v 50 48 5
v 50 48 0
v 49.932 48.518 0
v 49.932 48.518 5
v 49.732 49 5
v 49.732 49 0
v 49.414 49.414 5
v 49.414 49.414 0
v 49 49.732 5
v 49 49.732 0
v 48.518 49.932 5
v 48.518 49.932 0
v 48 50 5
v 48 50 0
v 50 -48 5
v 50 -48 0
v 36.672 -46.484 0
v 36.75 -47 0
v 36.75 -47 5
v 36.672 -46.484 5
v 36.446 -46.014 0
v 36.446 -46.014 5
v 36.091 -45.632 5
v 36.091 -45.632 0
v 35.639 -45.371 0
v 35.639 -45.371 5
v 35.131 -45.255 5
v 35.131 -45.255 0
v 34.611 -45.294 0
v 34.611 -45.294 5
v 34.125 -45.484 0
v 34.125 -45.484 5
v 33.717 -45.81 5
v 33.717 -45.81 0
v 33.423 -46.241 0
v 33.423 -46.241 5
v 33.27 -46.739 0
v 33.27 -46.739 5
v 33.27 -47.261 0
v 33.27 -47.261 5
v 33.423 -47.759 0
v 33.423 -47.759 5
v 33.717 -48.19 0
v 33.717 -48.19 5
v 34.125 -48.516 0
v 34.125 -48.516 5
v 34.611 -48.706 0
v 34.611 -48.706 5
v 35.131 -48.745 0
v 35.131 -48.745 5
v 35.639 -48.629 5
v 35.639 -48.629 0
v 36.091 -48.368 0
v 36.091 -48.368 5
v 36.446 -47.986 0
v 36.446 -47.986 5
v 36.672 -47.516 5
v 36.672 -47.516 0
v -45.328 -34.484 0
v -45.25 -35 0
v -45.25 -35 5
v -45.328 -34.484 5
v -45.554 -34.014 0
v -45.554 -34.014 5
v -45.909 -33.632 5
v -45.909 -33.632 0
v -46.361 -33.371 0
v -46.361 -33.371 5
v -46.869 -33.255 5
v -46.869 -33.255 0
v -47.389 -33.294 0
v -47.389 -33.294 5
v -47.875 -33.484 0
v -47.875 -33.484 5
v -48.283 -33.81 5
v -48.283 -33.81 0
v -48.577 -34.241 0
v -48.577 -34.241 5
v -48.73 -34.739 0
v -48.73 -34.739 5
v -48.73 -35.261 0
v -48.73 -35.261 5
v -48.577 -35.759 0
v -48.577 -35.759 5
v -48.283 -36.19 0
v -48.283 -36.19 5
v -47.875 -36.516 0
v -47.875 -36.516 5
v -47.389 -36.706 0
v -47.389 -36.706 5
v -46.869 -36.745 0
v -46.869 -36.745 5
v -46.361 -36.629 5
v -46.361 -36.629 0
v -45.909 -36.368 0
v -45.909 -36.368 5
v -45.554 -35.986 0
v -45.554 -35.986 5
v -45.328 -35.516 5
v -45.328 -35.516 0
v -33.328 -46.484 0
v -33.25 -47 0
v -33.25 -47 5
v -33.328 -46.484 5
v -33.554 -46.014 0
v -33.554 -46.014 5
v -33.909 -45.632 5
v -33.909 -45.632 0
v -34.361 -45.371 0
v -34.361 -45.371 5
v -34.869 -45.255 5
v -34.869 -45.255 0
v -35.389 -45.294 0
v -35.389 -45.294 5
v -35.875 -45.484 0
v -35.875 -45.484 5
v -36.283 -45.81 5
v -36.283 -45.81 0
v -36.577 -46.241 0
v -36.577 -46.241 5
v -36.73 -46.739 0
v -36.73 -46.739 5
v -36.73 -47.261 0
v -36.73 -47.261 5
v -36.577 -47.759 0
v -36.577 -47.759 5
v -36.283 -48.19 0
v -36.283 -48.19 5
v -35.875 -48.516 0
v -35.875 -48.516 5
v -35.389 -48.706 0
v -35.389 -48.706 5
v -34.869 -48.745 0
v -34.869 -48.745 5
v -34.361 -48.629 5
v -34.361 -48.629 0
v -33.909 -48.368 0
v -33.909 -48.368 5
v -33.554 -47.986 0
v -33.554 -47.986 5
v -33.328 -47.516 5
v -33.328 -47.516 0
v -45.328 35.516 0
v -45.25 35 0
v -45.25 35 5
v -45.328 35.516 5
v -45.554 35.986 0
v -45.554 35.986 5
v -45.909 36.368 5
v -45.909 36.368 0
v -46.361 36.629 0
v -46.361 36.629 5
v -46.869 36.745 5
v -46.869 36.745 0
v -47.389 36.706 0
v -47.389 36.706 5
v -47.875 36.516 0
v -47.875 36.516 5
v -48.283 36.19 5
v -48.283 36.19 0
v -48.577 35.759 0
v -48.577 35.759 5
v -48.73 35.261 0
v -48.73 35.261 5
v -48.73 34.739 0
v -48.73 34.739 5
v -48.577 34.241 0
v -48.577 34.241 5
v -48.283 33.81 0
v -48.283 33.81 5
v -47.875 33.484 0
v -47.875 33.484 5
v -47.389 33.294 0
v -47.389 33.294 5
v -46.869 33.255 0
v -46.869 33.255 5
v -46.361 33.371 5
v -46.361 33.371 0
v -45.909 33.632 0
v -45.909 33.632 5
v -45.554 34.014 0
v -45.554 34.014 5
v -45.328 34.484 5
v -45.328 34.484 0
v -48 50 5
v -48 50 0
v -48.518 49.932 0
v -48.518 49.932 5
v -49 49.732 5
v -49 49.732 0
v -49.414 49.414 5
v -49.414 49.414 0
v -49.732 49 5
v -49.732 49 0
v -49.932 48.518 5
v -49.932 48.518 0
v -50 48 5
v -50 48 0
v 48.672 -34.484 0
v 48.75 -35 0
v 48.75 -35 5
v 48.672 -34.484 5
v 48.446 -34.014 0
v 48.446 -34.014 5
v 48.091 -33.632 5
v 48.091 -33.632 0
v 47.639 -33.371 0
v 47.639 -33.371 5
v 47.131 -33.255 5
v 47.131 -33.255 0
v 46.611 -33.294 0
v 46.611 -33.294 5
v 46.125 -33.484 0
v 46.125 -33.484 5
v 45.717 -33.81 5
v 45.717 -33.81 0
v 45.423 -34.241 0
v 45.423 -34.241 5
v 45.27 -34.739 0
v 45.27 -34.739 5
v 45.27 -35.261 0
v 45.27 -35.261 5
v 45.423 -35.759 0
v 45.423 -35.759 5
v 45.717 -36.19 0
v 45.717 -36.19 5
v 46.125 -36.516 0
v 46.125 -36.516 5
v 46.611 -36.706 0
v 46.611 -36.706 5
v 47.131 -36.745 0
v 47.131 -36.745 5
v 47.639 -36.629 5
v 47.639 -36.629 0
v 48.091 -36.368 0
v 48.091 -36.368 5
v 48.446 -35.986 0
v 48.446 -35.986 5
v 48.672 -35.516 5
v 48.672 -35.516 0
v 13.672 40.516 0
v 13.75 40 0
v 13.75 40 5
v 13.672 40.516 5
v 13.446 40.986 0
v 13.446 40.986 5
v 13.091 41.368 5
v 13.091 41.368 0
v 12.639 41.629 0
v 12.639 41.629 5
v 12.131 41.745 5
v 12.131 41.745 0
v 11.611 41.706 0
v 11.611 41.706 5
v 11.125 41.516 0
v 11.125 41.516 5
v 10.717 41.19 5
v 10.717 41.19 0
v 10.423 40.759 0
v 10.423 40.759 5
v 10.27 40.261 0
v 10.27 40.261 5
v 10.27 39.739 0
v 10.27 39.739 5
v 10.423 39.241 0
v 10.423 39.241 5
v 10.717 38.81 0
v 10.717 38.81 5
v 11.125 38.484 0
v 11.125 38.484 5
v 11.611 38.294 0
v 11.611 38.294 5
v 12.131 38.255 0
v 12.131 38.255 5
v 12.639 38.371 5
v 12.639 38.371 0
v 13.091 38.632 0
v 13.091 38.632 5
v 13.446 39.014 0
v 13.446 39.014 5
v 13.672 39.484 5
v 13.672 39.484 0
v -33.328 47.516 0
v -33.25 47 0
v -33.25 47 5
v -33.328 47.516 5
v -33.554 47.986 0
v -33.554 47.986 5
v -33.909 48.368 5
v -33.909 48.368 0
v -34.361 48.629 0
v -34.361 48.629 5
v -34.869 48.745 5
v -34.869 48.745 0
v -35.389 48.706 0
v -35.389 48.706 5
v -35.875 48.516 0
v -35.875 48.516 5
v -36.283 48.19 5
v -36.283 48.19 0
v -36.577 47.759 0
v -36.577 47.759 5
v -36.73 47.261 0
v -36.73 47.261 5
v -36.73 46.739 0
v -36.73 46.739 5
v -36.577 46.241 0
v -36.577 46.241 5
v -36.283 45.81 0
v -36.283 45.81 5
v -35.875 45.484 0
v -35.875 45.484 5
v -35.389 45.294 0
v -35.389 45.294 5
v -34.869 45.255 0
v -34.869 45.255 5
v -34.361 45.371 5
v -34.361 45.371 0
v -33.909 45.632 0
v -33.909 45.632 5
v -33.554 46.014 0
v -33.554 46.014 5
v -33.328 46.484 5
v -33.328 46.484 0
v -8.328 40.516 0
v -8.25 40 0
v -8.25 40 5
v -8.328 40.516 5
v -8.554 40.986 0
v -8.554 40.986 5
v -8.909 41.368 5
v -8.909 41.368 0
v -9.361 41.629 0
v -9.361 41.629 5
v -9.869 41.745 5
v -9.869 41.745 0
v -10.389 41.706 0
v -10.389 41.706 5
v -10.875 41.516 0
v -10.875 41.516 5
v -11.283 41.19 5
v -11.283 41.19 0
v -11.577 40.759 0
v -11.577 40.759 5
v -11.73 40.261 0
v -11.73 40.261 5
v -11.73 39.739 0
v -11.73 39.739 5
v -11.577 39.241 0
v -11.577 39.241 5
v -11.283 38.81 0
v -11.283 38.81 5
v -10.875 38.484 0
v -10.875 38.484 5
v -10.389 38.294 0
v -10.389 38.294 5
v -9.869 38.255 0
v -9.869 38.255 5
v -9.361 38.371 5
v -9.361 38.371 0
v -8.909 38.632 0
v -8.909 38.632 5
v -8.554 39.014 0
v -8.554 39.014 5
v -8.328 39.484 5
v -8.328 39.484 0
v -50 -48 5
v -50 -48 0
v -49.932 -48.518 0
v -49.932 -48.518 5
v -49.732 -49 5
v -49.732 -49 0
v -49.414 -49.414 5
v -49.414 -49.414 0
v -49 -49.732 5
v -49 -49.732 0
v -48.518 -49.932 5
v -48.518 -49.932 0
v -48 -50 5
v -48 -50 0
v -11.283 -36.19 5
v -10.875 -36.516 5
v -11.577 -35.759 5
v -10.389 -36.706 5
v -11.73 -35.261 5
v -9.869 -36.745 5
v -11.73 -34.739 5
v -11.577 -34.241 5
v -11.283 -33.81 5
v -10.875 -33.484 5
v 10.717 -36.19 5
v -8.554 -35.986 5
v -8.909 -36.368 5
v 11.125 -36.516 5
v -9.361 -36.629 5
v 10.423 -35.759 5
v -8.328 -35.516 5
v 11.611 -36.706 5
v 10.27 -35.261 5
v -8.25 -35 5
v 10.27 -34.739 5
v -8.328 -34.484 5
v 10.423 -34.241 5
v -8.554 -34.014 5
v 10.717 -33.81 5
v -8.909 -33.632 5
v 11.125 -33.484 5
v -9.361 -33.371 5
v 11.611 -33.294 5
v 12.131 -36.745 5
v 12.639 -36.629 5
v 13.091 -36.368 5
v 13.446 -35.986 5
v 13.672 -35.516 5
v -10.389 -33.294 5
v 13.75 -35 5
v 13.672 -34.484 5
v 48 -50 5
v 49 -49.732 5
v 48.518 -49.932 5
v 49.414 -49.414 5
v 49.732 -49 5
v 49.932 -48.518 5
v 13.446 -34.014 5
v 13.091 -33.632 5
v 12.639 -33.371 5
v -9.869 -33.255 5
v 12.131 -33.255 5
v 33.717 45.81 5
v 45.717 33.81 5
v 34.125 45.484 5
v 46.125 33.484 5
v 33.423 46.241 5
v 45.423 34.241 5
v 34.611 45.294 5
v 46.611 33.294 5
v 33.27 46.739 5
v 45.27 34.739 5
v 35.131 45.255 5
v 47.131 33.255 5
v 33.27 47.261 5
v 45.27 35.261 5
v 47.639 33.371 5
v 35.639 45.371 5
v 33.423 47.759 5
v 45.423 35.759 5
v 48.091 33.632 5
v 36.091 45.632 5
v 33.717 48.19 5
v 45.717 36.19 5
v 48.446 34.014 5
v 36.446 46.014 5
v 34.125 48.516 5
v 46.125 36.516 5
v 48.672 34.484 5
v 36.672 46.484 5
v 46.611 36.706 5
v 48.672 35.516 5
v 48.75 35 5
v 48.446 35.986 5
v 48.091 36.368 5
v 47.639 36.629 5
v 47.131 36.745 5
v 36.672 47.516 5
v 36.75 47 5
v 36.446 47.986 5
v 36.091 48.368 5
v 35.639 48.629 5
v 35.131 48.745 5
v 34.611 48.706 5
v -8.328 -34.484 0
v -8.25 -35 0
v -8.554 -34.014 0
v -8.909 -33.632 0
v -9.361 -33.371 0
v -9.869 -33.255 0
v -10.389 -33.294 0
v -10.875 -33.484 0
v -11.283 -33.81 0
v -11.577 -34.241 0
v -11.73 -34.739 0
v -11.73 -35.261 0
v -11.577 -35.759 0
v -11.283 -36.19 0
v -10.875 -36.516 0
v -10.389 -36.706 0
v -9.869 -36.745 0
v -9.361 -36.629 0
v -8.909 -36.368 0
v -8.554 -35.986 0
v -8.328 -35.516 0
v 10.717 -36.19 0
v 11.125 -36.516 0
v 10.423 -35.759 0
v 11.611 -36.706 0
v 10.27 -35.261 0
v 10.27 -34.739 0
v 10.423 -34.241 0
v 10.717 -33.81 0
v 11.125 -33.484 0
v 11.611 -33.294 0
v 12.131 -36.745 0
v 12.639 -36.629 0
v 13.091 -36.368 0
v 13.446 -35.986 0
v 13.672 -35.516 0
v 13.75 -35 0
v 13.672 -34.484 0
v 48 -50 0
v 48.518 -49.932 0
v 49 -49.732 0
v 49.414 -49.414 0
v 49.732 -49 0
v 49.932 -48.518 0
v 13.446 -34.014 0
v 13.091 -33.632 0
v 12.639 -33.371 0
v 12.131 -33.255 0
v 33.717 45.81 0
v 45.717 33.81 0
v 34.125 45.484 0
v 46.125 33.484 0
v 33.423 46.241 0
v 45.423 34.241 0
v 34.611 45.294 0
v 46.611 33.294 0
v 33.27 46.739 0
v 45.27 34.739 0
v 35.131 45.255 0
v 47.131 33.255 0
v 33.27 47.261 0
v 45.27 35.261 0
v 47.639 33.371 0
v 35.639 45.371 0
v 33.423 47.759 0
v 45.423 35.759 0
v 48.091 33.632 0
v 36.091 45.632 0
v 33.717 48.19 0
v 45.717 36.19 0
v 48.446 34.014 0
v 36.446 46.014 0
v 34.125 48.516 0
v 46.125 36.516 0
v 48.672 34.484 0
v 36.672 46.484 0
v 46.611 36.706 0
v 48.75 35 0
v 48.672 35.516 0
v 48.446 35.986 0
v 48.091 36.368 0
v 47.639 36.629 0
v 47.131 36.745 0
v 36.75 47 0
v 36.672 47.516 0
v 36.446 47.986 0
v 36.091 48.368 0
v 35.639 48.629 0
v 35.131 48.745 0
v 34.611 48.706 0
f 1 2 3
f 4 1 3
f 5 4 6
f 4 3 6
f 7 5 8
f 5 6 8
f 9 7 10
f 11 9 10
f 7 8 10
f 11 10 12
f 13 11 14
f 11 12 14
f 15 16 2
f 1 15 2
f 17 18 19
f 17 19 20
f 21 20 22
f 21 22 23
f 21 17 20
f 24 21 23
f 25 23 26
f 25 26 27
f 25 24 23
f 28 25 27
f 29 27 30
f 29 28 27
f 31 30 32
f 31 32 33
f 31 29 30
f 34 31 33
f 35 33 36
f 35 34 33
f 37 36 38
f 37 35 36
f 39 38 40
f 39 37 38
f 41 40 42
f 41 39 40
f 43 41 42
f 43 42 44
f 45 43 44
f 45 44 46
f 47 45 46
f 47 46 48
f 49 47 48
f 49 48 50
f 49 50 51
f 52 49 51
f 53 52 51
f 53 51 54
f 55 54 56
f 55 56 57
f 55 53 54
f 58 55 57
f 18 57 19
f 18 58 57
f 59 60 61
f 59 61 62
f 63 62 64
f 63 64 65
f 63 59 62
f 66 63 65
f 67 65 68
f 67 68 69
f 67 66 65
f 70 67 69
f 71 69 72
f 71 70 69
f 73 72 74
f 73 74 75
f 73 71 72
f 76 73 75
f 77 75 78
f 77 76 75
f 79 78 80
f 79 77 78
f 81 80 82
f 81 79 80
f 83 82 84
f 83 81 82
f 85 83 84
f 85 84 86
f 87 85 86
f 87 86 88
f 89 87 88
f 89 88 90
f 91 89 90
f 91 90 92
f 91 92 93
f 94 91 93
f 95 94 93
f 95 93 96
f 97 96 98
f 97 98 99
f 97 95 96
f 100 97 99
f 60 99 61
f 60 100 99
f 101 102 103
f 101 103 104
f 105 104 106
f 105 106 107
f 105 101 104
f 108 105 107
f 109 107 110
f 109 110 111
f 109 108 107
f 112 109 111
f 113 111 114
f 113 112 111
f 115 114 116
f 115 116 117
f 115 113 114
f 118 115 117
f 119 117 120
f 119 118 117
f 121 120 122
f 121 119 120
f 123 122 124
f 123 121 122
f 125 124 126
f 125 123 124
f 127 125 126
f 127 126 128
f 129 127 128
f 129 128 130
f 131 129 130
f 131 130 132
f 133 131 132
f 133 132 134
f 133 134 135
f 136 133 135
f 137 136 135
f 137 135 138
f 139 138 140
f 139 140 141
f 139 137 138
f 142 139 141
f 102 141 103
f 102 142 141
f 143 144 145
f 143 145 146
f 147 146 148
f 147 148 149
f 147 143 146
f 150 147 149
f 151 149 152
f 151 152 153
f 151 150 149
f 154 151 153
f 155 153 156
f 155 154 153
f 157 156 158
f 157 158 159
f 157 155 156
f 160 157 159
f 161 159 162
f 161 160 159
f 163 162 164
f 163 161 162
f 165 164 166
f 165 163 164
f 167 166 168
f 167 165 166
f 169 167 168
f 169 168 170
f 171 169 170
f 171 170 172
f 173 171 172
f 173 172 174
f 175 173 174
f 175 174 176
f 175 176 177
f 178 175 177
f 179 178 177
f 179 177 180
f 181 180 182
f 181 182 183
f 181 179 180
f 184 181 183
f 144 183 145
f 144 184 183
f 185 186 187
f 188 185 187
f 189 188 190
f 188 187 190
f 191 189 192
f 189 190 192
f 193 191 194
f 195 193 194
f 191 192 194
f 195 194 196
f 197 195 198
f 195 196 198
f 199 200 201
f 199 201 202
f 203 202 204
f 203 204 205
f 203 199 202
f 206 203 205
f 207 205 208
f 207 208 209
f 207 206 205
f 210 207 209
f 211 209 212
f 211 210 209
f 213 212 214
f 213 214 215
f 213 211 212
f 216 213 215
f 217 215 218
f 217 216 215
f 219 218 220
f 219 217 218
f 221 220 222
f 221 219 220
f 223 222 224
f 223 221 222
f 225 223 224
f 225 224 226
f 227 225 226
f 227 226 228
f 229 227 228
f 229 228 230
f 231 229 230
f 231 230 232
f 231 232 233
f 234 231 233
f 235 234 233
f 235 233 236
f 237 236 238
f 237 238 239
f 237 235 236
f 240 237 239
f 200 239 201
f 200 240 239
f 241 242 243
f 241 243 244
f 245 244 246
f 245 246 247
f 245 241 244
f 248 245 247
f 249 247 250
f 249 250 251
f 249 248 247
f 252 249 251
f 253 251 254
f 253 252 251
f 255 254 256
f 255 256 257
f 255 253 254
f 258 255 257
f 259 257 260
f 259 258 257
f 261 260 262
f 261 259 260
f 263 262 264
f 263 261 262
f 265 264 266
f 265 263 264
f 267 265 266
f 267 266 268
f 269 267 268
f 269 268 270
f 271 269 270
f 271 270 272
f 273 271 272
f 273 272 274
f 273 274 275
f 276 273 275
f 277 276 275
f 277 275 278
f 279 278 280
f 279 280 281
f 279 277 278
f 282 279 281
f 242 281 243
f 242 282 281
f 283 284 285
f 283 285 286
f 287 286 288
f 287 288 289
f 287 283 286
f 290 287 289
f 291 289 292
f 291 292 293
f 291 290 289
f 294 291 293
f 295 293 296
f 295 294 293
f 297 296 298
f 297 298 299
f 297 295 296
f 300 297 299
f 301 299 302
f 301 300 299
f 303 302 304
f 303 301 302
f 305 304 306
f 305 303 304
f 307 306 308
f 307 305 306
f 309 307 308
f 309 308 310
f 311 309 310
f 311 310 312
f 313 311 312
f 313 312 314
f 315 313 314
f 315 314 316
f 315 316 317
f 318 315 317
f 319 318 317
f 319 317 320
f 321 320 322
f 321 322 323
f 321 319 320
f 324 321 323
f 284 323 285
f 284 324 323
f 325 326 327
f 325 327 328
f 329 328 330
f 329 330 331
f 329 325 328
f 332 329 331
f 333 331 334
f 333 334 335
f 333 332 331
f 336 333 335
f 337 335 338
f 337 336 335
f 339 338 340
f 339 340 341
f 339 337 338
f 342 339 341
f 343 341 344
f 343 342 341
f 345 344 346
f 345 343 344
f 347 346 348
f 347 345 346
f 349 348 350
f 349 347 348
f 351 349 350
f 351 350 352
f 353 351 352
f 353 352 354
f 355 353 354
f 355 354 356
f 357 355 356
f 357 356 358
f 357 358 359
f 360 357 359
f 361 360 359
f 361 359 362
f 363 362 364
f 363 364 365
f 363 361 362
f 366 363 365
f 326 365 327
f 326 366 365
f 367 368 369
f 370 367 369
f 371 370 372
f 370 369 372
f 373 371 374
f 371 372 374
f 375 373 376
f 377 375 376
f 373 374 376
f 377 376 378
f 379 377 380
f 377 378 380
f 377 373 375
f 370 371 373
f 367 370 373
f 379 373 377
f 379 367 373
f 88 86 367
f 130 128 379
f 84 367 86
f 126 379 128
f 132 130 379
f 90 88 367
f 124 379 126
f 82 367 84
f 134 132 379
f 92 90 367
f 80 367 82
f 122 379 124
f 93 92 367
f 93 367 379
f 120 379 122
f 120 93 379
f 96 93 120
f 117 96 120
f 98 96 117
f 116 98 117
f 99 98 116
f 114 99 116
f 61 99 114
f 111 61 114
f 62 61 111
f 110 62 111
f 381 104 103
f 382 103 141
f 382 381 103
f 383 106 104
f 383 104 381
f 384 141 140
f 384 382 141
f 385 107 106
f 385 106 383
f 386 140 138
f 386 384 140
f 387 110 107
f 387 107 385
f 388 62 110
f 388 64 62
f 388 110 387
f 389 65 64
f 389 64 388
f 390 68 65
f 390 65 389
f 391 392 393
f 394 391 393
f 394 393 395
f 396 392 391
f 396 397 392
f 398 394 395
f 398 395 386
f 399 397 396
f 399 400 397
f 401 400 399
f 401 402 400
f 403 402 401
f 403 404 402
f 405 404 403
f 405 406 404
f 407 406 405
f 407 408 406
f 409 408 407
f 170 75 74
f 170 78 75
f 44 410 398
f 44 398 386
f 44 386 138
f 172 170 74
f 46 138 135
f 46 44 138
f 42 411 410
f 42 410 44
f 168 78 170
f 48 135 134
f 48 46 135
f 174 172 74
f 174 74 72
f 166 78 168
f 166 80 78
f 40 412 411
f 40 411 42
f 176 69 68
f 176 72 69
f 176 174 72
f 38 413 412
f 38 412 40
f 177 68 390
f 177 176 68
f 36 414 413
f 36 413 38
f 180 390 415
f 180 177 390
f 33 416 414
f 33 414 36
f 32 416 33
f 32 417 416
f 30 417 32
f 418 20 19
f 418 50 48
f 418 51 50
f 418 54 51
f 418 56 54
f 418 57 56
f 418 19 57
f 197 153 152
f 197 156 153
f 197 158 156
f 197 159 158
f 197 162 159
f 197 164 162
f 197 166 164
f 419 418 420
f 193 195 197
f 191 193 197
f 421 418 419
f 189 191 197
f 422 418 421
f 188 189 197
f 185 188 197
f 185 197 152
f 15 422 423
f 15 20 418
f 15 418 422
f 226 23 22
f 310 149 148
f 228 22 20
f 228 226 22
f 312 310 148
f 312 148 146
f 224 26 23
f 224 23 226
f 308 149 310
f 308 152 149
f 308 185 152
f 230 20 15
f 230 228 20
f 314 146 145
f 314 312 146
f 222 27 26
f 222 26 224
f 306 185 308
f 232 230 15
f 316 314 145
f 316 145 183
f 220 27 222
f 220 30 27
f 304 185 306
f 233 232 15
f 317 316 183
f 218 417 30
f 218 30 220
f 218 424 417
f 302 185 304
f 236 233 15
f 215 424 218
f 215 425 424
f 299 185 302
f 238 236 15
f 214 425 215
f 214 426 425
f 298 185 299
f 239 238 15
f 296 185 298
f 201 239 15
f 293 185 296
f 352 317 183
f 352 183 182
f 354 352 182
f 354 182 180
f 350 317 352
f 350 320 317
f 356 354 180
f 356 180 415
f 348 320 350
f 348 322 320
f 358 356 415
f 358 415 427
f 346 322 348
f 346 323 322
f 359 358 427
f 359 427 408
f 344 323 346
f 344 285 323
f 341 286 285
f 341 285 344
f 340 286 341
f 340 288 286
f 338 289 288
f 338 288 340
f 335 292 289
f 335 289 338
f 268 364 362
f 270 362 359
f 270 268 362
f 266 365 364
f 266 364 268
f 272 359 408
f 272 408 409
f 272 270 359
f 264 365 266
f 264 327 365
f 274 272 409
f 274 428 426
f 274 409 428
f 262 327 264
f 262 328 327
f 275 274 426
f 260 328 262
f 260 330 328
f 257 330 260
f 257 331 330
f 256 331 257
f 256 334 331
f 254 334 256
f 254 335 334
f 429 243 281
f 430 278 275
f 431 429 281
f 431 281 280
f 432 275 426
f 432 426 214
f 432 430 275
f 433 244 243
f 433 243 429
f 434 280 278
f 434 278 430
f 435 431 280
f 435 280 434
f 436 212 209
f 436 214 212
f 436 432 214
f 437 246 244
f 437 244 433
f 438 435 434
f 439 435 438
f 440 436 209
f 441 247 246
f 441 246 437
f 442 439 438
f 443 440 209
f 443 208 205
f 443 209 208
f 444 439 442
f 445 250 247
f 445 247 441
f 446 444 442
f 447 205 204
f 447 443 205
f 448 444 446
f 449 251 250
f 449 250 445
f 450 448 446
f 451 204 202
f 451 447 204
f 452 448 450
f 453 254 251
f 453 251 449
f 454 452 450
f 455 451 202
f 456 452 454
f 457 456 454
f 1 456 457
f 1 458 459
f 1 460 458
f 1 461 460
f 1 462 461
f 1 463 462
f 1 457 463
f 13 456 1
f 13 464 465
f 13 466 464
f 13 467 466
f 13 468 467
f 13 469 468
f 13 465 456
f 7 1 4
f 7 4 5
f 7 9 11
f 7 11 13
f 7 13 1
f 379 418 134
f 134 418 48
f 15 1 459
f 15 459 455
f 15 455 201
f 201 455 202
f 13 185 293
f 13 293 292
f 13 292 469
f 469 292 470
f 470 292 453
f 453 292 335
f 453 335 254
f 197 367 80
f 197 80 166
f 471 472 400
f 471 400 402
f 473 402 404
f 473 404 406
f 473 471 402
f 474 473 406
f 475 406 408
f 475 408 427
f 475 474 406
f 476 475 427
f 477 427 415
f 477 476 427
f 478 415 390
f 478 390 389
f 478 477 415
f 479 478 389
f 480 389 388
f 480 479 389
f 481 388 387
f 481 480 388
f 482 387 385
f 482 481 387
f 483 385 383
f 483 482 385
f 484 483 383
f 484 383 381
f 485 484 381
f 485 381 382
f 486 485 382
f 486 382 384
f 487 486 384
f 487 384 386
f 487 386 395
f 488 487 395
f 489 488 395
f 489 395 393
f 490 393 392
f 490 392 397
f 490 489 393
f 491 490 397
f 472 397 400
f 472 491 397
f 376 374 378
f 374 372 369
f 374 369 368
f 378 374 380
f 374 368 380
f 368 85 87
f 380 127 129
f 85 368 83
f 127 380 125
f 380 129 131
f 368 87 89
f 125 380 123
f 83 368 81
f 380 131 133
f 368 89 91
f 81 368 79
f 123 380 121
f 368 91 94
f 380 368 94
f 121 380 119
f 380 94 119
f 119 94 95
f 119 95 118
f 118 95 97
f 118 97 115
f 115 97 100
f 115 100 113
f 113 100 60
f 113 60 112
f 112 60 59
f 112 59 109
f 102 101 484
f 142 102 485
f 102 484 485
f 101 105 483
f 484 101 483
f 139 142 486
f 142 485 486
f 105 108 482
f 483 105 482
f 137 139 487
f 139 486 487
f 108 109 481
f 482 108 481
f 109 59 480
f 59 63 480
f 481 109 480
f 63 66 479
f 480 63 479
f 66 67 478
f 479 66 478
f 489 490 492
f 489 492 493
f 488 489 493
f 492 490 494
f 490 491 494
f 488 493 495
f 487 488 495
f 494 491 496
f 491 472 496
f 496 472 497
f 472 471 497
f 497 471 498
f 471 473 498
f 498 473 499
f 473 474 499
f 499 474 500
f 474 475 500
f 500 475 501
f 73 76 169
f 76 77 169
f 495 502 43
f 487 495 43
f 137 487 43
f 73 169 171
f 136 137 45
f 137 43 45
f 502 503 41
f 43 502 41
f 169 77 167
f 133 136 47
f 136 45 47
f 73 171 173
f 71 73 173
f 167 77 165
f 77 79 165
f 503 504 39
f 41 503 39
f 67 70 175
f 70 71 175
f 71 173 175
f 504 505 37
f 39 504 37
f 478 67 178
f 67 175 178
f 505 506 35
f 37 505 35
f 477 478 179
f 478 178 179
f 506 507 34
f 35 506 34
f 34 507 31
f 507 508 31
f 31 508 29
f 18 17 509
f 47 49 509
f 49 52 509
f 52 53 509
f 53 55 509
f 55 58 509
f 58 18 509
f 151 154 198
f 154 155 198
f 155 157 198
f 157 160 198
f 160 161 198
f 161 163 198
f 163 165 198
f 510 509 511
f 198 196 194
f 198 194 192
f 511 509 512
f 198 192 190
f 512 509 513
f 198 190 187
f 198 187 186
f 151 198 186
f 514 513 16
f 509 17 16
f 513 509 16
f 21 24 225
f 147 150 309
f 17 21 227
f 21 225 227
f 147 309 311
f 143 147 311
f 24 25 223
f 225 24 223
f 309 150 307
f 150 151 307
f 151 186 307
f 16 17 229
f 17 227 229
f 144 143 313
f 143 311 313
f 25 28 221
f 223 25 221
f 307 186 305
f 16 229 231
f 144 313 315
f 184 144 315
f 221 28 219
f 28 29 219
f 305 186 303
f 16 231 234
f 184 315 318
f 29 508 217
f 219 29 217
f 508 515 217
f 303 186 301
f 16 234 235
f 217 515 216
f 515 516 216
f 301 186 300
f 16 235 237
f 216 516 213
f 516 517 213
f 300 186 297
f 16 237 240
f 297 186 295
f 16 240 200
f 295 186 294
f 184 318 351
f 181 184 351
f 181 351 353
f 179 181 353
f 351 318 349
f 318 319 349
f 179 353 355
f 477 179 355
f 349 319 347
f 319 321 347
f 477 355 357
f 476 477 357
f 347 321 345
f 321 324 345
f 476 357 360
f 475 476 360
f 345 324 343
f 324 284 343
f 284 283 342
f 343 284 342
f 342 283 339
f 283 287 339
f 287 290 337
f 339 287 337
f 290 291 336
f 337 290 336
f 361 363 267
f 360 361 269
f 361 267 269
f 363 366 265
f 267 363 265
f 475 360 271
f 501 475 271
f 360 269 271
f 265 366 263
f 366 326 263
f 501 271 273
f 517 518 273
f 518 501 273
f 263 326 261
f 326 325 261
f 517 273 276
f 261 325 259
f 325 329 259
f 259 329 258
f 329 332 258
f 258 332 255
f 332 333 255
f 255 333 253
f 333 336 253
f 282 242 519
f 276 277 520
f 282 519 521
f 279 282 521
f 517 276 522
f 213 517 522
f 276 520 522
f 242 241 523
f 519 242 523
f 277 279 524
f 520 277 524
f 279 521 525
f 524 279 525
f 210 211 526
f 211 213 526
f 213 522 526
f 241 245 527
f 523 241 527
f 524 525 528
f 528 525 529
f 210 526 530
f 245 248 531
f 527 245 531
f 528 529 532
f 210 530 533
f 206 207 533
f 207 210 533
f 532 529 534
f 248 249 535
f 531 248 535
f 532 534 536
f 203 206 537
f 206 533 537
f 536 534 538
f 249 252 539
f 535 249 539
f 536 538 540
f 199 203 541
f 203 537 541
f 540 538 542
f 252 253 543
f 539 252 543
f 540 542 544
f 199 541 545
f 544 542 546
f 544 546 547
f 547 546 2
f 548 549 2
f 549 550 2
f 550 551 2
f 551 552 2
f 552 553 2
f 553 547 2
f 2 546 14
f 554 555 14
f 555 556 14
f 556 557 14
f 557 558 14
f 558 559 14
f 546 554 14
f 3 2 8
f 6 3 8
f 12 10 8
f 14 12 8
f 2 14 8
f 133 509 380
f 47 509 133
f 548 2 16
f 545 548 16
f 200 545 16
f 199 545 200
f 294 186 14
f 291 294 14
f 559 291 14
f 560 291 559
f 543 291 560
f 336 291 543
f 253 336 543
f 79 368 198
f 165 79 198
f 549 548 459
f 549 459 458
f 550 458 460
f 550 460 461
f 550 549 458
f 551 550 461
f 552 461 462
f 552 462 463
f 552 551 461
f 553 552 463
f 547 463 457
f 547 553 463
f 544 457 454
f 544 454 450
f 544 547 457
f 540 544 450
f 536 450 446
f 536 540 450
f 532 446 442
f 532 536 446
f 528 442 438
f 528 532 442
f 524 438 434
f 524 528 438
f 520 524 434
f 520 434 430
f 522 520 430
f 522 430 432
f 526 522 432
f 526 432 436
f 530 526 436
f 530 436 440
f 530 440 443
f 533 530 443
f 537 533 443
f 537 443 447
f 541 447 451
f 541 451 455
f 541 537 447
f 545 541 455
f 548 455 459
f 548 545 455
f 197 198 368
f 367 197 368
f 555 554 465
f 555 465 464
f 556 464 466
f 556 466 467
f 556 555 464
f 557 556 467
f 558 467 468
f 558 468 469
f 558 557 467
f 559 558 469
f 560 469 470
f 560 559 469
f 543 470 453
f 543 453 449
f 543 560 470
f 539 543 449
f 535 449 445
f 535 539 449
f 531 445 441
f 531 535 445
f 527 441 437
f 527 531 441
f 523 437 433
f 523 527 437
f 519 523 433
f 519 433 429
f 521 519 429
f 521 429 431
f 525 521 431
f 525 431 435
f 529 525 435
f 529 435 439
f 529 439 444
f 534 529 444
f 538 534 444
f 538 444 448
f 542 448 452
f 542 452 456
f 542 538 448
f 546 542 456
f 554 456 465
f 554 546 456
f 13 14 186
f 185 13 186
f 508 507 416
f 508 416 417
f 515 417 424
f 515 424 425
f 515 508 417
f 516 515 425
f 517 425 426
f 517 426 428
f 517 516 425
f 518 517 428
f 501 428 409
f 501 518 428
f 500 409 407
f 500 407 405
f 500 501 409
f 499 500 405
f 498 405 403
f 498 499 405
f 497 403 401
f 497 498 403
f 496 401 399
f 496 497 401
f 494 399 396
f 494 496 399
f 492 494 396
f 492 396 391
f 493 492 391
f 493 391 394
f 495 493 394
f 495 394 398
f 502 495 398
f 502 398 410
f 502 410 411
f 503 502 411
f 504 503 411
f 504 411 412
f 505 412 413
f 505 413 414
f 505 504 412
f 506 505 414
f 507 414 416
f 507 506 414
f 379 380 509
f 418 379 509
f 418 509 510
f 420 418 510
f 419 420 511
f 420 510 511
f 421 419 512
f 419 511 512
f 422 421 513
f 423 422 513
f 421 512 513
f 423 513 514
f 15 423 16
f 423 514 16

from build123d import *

# Parameters (mm, degrees)
SKETCH_1_R      = 1.75
EXTRUDE_1_DEPTH = 5


with BuildPart() as part:
    # Эскиз1 → Бобышка-Вытянуть1 (new body)
    with BuildSketch(Plane.XY):
        with BuildLine():
            Line((-48, -50), (48, -50))
            ThreePointArc((48, -50), (49.414213562, -49.414213562), (50, -48))
            Line((50, -48), (50, 48))
            ThreePointArc((50, 48), (49.414213562, 49.414213562), (48, 50))
            Line((48, 50), (-48, 50))
            ThreePointArc((-48, 50), (-49.414213562, 49.414213562), (-50, 48))
            Line((-50, 48), (-50, -48))
            ThreePointArc((-50, -48), (-49.414213562, -49.414213562), (-48, -50))
        make_face()
        with Locations((-47, 35)):
            Circle(SKETCH_1_R, mode=Mode.SUBTRACT)
        with Locations((47, 35)):
            Circle(SKETCH_1_R, mode=Mode.SUBTRACT)
        with Locations((47, -35)):
            Circle(SKETCH_1_R, mode=Mode.SUBTRACT)
        with Locations((-47, -35)):
            Circle(SKETCH_1_R, mode=Mode.SUBTRACT)
        with Locations((-35, 47)):
            Circle(SKETCH_1_R, mode=Mode.SUBTRACT)
        with Locations((35, 47)):
            Circle(SKETCH_1_R, mode=Mode.SUBTRACT)
        with Locations((-35, -47)):
            Circle(SKETCH_1_R, mode=Mode.SUBTRACT)
        with Locations((35, -47)):
            Circle(SKETCH_1_R, mode=Mode.SUBTRACT)
        with Locations((-10, 40)):
            Circle(SKETCH_1_R, mode=Mode.SUBTRACT)
        with Locations((12, 40)):
            Circle(SKETCH_1_R, mode=Mode.SUBTRACT)
        with Locations((-10, -35)):
            Circle(SKETCH_1_R, mode=Mode.SUBTRACT)
        with Locations((12, -35)):
            Circle(SKETCH_1_R, mode=Mode.SUBTRACT)
    extrude(amount=EXTRUDE_1_DEPTH)


solid = part.part
